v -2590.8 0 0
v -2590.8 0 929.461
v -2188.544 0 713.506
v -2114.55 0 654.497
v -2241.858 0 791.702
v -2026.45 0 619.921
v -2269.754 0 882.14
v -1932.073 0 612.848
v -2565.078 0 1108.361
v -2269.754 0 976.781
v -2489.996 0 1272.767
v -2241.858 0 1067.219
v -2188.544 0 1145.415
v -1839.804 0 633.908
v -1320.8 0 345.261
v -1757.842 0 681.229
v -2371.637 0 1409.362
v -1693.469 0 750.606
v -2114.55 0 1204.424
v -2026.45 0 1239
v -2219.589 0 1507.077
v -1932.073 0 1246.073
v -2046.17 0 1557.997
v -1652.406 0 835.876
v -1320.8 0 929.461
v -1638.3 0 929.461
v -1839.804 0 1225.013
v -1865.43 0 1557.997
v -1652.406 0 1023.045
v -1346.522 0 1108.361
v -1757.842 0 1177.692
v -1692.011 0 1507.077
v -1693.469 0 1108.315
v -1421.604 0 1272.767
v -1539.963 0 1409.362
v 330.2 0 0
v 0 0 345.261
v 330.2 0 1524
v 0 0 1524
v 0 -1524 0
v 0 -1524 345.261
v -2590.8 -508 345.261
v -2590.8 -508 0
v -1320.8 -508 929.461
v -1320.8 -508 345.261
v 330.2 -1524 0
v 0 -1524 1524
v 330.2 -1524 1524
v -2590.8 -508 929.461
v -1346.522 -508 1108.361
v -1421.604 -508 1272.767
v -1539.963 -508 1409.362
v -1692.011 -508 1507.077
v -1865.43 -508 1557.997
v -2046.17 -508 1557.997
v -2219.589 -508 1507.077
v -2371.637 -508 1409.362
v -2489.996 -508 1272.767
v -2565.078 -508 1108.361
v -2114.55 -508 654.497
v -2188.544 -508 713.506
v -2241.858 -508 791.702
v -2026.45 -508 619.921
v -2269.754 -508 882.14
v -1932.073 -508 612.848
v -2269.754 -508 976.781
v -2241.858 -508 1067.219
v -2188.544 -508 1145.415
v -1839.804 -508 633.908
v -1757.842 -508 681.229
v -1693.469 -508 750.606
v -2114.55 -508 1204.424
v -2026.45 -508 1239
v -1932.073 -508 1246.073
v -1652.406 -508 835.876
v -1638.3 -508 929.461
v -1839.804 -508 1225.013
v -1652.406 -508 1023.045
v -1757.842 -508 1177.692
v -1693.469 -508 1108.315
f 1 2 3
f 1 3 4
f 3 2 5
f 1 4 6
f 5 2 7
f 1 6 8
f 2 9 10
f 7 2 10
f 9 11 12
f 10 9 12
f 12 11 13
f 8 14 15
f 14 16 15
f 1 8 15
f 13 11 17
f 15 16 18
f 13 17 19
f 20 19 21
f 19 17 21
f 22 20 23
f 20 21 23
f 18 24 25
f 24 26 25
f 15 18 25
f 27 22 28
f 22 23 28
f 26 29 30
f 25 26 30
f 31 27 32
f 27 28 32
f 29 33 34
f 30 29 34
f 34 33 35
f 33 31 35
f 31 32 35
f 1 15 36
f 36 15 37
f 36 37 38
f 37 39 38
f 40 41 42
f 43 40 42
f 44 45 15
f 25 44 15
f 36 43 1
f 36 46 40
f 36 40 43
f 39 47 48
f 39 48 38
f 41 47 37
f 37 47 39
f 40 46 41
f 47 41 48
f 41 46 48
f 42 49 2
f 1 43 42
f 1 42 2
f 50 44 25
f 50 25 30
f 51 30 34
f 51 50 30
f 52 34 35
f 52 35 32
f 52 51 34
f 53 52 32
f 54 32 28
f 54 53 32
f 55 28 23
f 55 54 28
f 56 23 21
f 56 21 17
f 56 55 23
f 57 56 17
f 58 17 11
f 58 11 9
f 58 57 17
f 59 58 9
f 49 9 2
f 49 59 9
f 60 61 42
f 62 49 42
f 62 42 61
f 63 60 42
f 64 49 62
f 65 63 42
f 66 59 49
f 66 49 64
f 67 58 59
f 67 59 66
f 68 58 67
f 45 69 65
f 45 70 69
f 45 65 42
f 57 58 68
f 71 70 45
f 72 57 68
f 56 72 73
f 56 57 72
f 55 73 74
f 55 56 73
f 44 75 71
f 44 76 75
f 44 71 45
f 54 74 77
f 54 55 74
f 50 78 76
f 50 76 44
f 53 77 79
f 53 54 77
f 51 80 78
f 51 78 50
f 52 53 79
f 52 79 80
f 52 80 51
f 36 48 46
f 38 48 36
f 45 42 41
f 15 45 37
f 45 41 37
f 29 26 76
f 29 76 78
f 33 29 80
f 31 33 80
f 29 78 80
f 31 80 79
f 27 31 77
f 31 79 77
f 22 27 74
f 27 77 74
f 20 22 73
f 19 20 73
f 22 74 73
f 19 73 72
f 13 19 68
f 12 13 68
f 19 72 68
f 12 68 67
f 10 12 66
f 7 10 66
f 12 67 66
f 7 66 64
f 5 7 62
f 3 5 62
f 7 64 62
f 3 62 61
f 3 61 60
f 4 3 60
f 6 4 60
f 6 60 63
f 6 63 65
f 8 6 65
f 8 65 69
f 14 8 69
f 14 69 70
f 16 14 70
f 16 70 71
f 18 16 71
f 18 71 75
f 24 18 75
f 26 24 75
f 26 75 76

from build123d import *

# Parameters (mm, degrees)
F0_W      = 1524
F0_H      = 1524
F1_DEPTH  = 25.4
F2_DEPTH  = 304.8
F3_W      = 1524
F3_H      = 345.2605605125
F4_DEPTH  = 2921
F5_W      = 1270
F5_H      = 508
F6_DEPTH  = 584.2
F8_DEPTH  = 508
F9_R      = 317.5
F10_DEPTH = 5212.08
F12_DEPTH = 508


with BuildPart() as f1:
    # F0 (on Right) → F1 (new body)
    with BuildSketch(Plane.YZ):
        with Locations((-762, 762)):
            Rectangle(F0_W, F0_H)
    extrude(amount=F1_DEPTH)

    # F2 (add): a face of the model
    f2_faces = [f1.faces().sort_by_distance(p)[0] for p in [
        (25.4, -762, 762),
    ]]
    extrude(f2_faces, amount=F2_DEPTH)

    # F3 (on face) → F4 (join)
    with BuildSketch(Plane.YZ.offset(330.2)):
        with Locations((-762, 172.6302802563)):
            Rectangle(F3_W, F3_H)
    extrude(amount=-F4_DEPTH)

    # F5 (on face) → F6 (join)
    with BuildSketch(Plane.XY.offset(345.2605605125)):
        with Locations((-1955.8, -254)):
            Rectangle(F5_W, F5_H)
    extrude(amount=F6_DEPTH)

    # F7 (on face) → F8 (join)
    with BuildSketch(Plane.XZ.offset(508)):
        with BuildLine():
            Line((-2590.8, 929.4605605125), (-1320.8, 929.4605605125))
            ThreePointArc((-1320.8, 929.4605605125), (-1955.8, 1564.4605605125), (-2590.8, 929.4605605125))
        make_face()
    extrude(amount=-F8_DEPTH)

    # F9 (on face) → F10 (cut)
    with BuildSketch(Plane.XZ.offset(508)):
        with Locations((-1955.8, 929.4605605125)):
            Circle(F9_R)
    extrude(amount=-F10_DEPTH, mode=Mode.SUBTRACT)

    # F11 (on face) → F12 (cut)
    with BuildSketch(Plane.XY.offset(345.2605605125)):
        Polygon((0, -1524), (-2590.8, -508), (-2590.8, -1524), align=None)
    extrude(amount=-F12_DEPTH, mode=Mode.SUBTRACT)


solid = f1.part
